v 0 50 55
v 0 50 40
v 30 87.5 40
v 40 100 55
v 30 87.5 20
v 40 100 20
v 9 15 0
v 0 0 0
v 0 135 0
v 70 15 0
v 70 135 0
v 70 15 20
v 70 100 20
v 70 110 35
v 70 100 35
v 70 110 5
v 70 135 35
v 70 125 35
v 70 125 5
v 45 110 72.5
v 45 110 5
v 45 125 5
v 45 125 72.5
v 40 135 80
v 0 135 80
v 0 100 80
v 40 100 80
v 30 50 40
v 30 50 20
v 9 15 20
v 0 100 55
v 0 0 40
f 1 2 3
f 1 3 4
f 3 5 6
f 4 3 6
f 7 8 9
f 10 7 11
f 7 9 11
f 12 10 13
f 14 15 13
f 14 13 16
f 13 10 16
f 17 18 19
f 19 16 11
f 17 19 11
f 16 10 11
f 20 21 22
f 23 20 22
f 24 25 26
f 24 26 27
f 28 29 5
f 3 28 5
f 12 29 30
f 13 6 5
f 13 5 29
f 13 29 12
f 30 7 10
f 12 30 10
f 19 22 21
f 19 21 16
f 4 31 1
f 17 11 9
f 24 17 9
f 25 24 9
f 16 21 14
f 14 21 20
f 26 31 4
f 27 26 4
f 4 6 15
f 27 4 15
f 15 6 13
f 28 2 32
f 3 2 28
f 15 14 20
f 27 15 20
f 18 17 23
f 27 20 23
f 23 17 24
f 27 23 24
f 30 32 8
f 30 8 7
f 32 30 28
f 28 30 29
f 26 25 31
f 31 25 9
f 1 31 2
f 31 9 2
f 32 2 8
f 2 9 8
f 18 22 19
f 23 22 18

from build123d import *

# Parameters (mm, degrees)
F1_DEPTH = 40
F2_DEPTH = 55
F3_DEPTH = 80
F4_DEPTH = 20
F5_W     = 25
F5_H     = 15
F6_DEPTH = 75
F8_DEPTH = 35


with BuildPart() as f1:
    # F0 (on Top) → F1 (new body)
    with BuildSketch(Plane.XY):
        Polygon((0, 50), (0, 0), (9, 15), (30, 50), (30, 87.5), align=None)
    extrude(amount=F1_DEPTH)

    # F0 (on Top) → F2 (join)
    with BuildSketch(Plane.XY):
        Polygon((0, 100), (0, 50), (30, 87.5), (40, 100), align=None)
    extrude(amount=F2_DEPTH)

    # F0 (on Top) → F3 (join)
    with BuildSketch(Plane.XY):
        Polygon((0, 135), (0, 100), (40, 100), (70, 100), (70, 135), align=None)
    extrude(amount=F3_DEPTH)

    # F0 (on Top) → F4 (join)
    with BuildSketch(Plane.XY):
        Polygon((30, 50), (9, 15), (70, 15), (70, 100), (40, 100), (30, 87.5), align=None)
    extrude(amount=F4_DEPTH)

    # F5 (on face) → F6 (cut)
    with BuildSketch(Plane.XY.offset(80)):
        with Locations((57.5, 117.5)):
            Rectangle(F5_W, F5_H)
    extrude(amount=-F6_DEPTH, mode=Mode.SUBTRACT)

    # F7 (on face) → F8 (cut, through all)
    with BuildSketch(Plane(origin=(0, 135, 0), x_dir=(-1, 0, 0), z_dir=(0, 1, 0))):
        Polygon((-70, 80), (-70, 35), (-40, 80), align=None)
    extrude(amount=-F8_DEPTH, mode=Mode.SUBTRACT)


solid = f1.part
